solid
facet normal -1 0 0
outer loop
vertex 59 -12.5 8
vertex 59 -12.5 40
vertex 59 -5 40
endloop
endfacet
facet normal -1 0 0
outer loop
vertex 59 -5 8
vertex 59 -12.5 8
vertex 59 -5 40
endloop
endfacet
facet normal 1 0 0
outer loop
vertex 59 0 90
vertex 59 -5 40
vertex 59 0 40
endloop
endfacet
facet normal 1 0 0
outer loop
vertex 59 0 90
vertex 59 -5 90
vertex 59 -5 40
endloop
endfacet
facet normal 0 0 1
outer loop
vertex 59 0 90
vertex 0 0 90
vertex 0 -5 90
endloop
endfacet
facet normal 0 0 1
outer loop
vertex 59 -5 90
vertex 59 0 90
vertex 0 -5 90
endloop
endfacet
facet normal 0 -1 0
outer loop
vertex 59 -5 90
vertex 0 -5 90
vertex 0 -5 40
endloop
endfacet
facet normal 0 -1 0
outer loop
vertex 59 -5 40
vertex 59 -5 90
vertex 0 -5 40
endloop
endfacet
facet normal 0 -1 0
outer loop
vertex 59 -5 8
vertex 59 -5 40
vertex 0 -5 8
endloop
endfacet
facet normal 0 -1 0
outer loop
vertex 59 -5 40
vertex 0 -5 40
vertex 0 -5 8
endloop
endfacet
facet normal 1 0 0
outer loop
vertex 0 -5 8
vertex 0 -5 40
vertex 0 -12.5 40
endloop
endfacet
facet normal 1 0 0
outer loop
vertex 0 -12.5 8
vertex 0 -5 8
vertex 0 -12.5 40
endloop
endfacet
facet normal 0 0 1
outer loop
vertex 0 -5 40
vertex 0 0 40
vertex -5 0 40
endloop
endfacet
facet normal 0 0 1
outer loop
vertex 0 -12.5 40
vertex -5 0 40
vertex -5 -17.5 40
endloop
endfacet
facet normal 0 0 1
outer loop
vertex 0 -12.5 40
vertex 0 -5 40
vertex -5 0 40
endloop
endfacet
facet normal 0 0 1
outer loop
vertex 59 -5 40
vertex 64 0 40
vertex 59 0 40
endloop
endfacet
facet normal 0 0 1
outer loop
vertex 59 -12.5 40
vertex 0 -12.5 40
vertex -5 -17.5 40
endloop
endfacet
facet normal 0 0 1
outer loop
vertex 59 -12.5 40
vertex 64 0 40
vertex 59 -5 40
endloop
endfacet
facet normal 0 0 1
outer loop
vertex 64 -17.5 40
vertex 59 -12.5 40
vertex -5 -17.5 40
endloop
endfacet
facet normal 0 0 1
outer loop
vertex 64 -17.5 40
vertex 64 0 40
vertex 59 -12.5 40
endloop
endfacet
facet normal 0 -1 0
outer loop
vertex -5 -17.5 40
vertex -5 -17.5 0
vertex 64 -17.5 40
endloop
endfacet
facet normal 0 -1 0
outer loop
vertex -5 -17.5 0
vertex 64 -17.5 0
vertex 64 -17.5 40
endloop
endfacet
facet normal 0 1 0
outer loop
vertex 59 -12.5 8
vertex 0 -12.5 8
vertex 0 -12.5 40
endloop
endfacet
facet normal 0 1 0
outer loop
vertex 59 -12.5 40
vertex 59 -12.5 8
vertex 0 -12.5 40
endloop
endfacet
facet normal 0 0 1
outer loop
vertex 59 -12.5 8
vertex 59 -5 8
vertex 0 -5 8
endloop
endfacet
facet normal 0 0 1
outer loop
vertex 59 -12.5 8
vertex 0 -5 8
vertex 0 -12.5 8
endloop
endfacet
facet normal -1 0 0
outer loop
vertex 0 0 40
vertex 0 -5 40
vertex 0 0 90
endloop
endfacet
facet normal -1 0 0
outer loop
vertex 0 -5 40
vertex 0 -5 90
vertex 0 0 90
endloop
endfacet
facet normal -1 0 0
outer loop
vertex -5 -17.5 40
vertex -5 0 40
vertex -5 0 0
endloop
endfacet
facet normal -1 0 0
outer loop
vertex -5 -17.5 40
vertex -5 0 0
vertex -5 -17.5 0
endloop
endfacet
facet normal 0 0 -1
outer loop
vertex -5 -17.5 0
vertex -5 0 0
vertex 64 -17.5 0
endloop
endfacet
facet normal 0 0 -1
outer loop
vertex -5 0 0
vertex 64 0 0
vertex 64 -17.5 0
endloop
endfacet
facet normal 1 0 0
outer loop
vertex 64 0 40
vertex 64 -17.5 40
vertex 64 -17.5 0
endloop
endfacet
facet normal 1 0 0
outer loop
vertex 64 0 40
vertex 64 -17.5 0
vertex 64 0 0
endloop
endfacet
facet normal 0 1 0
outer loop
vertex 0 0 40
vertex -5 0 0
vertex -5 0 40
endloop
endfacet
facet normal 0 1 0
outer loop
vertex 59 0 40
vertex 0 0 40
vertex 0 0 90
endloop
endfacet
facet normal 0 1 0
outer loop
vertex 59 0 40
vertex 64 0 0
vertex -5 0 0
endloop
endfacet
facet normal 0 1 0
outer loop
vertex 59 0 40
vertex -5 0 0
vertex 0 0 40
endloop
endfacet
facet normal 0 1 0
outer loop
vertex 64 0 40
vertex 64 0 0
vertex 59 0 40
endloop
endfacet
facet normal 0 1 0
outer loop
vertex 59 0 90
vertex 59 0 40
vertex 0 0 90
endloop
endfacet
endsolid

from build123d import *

# Parameters (mm, degrees)
F1_DEPTH = 59
F2_W     = 17.5
F2_H     = 40
F3_DEPTH = 5
F4_W     = 17.5
F4_H     = 40
F5_DEPTH = 5


with BuildPart() as f1:
    # F0 (on Right) → F1 (new body)
    with BuildSketch(Plane.YZ):
        Polygon((-17.5, 0), (0, 0), (0, 90), (-5, 90), (-5, 8), (-12.5, 8), (-12.5, 40), (-17.5, 40), align=None)
    extrude(amount=F1_DEPTH)

    # F2 (on face) → F3 (join)
    with BuildSketch(Plane.YZ.offset(59)):
        with Locations((-8.75, 20)):
            Rectangle(F2_W, F2_H)
    extrude(amount=F3_DEPTH)

    # F4 (on face) → F5 (join)
    with BuildSketch(Plane(origin=(0, 0, 0), x_dir=(0, -1, 0), z_dir=(-1, 0, 0))):
        with Locations((8.75, 20)):
            Rectangle(F4_W, F4_H)
    extrude(amount=F5_DEPTH)


solid = f1.part
